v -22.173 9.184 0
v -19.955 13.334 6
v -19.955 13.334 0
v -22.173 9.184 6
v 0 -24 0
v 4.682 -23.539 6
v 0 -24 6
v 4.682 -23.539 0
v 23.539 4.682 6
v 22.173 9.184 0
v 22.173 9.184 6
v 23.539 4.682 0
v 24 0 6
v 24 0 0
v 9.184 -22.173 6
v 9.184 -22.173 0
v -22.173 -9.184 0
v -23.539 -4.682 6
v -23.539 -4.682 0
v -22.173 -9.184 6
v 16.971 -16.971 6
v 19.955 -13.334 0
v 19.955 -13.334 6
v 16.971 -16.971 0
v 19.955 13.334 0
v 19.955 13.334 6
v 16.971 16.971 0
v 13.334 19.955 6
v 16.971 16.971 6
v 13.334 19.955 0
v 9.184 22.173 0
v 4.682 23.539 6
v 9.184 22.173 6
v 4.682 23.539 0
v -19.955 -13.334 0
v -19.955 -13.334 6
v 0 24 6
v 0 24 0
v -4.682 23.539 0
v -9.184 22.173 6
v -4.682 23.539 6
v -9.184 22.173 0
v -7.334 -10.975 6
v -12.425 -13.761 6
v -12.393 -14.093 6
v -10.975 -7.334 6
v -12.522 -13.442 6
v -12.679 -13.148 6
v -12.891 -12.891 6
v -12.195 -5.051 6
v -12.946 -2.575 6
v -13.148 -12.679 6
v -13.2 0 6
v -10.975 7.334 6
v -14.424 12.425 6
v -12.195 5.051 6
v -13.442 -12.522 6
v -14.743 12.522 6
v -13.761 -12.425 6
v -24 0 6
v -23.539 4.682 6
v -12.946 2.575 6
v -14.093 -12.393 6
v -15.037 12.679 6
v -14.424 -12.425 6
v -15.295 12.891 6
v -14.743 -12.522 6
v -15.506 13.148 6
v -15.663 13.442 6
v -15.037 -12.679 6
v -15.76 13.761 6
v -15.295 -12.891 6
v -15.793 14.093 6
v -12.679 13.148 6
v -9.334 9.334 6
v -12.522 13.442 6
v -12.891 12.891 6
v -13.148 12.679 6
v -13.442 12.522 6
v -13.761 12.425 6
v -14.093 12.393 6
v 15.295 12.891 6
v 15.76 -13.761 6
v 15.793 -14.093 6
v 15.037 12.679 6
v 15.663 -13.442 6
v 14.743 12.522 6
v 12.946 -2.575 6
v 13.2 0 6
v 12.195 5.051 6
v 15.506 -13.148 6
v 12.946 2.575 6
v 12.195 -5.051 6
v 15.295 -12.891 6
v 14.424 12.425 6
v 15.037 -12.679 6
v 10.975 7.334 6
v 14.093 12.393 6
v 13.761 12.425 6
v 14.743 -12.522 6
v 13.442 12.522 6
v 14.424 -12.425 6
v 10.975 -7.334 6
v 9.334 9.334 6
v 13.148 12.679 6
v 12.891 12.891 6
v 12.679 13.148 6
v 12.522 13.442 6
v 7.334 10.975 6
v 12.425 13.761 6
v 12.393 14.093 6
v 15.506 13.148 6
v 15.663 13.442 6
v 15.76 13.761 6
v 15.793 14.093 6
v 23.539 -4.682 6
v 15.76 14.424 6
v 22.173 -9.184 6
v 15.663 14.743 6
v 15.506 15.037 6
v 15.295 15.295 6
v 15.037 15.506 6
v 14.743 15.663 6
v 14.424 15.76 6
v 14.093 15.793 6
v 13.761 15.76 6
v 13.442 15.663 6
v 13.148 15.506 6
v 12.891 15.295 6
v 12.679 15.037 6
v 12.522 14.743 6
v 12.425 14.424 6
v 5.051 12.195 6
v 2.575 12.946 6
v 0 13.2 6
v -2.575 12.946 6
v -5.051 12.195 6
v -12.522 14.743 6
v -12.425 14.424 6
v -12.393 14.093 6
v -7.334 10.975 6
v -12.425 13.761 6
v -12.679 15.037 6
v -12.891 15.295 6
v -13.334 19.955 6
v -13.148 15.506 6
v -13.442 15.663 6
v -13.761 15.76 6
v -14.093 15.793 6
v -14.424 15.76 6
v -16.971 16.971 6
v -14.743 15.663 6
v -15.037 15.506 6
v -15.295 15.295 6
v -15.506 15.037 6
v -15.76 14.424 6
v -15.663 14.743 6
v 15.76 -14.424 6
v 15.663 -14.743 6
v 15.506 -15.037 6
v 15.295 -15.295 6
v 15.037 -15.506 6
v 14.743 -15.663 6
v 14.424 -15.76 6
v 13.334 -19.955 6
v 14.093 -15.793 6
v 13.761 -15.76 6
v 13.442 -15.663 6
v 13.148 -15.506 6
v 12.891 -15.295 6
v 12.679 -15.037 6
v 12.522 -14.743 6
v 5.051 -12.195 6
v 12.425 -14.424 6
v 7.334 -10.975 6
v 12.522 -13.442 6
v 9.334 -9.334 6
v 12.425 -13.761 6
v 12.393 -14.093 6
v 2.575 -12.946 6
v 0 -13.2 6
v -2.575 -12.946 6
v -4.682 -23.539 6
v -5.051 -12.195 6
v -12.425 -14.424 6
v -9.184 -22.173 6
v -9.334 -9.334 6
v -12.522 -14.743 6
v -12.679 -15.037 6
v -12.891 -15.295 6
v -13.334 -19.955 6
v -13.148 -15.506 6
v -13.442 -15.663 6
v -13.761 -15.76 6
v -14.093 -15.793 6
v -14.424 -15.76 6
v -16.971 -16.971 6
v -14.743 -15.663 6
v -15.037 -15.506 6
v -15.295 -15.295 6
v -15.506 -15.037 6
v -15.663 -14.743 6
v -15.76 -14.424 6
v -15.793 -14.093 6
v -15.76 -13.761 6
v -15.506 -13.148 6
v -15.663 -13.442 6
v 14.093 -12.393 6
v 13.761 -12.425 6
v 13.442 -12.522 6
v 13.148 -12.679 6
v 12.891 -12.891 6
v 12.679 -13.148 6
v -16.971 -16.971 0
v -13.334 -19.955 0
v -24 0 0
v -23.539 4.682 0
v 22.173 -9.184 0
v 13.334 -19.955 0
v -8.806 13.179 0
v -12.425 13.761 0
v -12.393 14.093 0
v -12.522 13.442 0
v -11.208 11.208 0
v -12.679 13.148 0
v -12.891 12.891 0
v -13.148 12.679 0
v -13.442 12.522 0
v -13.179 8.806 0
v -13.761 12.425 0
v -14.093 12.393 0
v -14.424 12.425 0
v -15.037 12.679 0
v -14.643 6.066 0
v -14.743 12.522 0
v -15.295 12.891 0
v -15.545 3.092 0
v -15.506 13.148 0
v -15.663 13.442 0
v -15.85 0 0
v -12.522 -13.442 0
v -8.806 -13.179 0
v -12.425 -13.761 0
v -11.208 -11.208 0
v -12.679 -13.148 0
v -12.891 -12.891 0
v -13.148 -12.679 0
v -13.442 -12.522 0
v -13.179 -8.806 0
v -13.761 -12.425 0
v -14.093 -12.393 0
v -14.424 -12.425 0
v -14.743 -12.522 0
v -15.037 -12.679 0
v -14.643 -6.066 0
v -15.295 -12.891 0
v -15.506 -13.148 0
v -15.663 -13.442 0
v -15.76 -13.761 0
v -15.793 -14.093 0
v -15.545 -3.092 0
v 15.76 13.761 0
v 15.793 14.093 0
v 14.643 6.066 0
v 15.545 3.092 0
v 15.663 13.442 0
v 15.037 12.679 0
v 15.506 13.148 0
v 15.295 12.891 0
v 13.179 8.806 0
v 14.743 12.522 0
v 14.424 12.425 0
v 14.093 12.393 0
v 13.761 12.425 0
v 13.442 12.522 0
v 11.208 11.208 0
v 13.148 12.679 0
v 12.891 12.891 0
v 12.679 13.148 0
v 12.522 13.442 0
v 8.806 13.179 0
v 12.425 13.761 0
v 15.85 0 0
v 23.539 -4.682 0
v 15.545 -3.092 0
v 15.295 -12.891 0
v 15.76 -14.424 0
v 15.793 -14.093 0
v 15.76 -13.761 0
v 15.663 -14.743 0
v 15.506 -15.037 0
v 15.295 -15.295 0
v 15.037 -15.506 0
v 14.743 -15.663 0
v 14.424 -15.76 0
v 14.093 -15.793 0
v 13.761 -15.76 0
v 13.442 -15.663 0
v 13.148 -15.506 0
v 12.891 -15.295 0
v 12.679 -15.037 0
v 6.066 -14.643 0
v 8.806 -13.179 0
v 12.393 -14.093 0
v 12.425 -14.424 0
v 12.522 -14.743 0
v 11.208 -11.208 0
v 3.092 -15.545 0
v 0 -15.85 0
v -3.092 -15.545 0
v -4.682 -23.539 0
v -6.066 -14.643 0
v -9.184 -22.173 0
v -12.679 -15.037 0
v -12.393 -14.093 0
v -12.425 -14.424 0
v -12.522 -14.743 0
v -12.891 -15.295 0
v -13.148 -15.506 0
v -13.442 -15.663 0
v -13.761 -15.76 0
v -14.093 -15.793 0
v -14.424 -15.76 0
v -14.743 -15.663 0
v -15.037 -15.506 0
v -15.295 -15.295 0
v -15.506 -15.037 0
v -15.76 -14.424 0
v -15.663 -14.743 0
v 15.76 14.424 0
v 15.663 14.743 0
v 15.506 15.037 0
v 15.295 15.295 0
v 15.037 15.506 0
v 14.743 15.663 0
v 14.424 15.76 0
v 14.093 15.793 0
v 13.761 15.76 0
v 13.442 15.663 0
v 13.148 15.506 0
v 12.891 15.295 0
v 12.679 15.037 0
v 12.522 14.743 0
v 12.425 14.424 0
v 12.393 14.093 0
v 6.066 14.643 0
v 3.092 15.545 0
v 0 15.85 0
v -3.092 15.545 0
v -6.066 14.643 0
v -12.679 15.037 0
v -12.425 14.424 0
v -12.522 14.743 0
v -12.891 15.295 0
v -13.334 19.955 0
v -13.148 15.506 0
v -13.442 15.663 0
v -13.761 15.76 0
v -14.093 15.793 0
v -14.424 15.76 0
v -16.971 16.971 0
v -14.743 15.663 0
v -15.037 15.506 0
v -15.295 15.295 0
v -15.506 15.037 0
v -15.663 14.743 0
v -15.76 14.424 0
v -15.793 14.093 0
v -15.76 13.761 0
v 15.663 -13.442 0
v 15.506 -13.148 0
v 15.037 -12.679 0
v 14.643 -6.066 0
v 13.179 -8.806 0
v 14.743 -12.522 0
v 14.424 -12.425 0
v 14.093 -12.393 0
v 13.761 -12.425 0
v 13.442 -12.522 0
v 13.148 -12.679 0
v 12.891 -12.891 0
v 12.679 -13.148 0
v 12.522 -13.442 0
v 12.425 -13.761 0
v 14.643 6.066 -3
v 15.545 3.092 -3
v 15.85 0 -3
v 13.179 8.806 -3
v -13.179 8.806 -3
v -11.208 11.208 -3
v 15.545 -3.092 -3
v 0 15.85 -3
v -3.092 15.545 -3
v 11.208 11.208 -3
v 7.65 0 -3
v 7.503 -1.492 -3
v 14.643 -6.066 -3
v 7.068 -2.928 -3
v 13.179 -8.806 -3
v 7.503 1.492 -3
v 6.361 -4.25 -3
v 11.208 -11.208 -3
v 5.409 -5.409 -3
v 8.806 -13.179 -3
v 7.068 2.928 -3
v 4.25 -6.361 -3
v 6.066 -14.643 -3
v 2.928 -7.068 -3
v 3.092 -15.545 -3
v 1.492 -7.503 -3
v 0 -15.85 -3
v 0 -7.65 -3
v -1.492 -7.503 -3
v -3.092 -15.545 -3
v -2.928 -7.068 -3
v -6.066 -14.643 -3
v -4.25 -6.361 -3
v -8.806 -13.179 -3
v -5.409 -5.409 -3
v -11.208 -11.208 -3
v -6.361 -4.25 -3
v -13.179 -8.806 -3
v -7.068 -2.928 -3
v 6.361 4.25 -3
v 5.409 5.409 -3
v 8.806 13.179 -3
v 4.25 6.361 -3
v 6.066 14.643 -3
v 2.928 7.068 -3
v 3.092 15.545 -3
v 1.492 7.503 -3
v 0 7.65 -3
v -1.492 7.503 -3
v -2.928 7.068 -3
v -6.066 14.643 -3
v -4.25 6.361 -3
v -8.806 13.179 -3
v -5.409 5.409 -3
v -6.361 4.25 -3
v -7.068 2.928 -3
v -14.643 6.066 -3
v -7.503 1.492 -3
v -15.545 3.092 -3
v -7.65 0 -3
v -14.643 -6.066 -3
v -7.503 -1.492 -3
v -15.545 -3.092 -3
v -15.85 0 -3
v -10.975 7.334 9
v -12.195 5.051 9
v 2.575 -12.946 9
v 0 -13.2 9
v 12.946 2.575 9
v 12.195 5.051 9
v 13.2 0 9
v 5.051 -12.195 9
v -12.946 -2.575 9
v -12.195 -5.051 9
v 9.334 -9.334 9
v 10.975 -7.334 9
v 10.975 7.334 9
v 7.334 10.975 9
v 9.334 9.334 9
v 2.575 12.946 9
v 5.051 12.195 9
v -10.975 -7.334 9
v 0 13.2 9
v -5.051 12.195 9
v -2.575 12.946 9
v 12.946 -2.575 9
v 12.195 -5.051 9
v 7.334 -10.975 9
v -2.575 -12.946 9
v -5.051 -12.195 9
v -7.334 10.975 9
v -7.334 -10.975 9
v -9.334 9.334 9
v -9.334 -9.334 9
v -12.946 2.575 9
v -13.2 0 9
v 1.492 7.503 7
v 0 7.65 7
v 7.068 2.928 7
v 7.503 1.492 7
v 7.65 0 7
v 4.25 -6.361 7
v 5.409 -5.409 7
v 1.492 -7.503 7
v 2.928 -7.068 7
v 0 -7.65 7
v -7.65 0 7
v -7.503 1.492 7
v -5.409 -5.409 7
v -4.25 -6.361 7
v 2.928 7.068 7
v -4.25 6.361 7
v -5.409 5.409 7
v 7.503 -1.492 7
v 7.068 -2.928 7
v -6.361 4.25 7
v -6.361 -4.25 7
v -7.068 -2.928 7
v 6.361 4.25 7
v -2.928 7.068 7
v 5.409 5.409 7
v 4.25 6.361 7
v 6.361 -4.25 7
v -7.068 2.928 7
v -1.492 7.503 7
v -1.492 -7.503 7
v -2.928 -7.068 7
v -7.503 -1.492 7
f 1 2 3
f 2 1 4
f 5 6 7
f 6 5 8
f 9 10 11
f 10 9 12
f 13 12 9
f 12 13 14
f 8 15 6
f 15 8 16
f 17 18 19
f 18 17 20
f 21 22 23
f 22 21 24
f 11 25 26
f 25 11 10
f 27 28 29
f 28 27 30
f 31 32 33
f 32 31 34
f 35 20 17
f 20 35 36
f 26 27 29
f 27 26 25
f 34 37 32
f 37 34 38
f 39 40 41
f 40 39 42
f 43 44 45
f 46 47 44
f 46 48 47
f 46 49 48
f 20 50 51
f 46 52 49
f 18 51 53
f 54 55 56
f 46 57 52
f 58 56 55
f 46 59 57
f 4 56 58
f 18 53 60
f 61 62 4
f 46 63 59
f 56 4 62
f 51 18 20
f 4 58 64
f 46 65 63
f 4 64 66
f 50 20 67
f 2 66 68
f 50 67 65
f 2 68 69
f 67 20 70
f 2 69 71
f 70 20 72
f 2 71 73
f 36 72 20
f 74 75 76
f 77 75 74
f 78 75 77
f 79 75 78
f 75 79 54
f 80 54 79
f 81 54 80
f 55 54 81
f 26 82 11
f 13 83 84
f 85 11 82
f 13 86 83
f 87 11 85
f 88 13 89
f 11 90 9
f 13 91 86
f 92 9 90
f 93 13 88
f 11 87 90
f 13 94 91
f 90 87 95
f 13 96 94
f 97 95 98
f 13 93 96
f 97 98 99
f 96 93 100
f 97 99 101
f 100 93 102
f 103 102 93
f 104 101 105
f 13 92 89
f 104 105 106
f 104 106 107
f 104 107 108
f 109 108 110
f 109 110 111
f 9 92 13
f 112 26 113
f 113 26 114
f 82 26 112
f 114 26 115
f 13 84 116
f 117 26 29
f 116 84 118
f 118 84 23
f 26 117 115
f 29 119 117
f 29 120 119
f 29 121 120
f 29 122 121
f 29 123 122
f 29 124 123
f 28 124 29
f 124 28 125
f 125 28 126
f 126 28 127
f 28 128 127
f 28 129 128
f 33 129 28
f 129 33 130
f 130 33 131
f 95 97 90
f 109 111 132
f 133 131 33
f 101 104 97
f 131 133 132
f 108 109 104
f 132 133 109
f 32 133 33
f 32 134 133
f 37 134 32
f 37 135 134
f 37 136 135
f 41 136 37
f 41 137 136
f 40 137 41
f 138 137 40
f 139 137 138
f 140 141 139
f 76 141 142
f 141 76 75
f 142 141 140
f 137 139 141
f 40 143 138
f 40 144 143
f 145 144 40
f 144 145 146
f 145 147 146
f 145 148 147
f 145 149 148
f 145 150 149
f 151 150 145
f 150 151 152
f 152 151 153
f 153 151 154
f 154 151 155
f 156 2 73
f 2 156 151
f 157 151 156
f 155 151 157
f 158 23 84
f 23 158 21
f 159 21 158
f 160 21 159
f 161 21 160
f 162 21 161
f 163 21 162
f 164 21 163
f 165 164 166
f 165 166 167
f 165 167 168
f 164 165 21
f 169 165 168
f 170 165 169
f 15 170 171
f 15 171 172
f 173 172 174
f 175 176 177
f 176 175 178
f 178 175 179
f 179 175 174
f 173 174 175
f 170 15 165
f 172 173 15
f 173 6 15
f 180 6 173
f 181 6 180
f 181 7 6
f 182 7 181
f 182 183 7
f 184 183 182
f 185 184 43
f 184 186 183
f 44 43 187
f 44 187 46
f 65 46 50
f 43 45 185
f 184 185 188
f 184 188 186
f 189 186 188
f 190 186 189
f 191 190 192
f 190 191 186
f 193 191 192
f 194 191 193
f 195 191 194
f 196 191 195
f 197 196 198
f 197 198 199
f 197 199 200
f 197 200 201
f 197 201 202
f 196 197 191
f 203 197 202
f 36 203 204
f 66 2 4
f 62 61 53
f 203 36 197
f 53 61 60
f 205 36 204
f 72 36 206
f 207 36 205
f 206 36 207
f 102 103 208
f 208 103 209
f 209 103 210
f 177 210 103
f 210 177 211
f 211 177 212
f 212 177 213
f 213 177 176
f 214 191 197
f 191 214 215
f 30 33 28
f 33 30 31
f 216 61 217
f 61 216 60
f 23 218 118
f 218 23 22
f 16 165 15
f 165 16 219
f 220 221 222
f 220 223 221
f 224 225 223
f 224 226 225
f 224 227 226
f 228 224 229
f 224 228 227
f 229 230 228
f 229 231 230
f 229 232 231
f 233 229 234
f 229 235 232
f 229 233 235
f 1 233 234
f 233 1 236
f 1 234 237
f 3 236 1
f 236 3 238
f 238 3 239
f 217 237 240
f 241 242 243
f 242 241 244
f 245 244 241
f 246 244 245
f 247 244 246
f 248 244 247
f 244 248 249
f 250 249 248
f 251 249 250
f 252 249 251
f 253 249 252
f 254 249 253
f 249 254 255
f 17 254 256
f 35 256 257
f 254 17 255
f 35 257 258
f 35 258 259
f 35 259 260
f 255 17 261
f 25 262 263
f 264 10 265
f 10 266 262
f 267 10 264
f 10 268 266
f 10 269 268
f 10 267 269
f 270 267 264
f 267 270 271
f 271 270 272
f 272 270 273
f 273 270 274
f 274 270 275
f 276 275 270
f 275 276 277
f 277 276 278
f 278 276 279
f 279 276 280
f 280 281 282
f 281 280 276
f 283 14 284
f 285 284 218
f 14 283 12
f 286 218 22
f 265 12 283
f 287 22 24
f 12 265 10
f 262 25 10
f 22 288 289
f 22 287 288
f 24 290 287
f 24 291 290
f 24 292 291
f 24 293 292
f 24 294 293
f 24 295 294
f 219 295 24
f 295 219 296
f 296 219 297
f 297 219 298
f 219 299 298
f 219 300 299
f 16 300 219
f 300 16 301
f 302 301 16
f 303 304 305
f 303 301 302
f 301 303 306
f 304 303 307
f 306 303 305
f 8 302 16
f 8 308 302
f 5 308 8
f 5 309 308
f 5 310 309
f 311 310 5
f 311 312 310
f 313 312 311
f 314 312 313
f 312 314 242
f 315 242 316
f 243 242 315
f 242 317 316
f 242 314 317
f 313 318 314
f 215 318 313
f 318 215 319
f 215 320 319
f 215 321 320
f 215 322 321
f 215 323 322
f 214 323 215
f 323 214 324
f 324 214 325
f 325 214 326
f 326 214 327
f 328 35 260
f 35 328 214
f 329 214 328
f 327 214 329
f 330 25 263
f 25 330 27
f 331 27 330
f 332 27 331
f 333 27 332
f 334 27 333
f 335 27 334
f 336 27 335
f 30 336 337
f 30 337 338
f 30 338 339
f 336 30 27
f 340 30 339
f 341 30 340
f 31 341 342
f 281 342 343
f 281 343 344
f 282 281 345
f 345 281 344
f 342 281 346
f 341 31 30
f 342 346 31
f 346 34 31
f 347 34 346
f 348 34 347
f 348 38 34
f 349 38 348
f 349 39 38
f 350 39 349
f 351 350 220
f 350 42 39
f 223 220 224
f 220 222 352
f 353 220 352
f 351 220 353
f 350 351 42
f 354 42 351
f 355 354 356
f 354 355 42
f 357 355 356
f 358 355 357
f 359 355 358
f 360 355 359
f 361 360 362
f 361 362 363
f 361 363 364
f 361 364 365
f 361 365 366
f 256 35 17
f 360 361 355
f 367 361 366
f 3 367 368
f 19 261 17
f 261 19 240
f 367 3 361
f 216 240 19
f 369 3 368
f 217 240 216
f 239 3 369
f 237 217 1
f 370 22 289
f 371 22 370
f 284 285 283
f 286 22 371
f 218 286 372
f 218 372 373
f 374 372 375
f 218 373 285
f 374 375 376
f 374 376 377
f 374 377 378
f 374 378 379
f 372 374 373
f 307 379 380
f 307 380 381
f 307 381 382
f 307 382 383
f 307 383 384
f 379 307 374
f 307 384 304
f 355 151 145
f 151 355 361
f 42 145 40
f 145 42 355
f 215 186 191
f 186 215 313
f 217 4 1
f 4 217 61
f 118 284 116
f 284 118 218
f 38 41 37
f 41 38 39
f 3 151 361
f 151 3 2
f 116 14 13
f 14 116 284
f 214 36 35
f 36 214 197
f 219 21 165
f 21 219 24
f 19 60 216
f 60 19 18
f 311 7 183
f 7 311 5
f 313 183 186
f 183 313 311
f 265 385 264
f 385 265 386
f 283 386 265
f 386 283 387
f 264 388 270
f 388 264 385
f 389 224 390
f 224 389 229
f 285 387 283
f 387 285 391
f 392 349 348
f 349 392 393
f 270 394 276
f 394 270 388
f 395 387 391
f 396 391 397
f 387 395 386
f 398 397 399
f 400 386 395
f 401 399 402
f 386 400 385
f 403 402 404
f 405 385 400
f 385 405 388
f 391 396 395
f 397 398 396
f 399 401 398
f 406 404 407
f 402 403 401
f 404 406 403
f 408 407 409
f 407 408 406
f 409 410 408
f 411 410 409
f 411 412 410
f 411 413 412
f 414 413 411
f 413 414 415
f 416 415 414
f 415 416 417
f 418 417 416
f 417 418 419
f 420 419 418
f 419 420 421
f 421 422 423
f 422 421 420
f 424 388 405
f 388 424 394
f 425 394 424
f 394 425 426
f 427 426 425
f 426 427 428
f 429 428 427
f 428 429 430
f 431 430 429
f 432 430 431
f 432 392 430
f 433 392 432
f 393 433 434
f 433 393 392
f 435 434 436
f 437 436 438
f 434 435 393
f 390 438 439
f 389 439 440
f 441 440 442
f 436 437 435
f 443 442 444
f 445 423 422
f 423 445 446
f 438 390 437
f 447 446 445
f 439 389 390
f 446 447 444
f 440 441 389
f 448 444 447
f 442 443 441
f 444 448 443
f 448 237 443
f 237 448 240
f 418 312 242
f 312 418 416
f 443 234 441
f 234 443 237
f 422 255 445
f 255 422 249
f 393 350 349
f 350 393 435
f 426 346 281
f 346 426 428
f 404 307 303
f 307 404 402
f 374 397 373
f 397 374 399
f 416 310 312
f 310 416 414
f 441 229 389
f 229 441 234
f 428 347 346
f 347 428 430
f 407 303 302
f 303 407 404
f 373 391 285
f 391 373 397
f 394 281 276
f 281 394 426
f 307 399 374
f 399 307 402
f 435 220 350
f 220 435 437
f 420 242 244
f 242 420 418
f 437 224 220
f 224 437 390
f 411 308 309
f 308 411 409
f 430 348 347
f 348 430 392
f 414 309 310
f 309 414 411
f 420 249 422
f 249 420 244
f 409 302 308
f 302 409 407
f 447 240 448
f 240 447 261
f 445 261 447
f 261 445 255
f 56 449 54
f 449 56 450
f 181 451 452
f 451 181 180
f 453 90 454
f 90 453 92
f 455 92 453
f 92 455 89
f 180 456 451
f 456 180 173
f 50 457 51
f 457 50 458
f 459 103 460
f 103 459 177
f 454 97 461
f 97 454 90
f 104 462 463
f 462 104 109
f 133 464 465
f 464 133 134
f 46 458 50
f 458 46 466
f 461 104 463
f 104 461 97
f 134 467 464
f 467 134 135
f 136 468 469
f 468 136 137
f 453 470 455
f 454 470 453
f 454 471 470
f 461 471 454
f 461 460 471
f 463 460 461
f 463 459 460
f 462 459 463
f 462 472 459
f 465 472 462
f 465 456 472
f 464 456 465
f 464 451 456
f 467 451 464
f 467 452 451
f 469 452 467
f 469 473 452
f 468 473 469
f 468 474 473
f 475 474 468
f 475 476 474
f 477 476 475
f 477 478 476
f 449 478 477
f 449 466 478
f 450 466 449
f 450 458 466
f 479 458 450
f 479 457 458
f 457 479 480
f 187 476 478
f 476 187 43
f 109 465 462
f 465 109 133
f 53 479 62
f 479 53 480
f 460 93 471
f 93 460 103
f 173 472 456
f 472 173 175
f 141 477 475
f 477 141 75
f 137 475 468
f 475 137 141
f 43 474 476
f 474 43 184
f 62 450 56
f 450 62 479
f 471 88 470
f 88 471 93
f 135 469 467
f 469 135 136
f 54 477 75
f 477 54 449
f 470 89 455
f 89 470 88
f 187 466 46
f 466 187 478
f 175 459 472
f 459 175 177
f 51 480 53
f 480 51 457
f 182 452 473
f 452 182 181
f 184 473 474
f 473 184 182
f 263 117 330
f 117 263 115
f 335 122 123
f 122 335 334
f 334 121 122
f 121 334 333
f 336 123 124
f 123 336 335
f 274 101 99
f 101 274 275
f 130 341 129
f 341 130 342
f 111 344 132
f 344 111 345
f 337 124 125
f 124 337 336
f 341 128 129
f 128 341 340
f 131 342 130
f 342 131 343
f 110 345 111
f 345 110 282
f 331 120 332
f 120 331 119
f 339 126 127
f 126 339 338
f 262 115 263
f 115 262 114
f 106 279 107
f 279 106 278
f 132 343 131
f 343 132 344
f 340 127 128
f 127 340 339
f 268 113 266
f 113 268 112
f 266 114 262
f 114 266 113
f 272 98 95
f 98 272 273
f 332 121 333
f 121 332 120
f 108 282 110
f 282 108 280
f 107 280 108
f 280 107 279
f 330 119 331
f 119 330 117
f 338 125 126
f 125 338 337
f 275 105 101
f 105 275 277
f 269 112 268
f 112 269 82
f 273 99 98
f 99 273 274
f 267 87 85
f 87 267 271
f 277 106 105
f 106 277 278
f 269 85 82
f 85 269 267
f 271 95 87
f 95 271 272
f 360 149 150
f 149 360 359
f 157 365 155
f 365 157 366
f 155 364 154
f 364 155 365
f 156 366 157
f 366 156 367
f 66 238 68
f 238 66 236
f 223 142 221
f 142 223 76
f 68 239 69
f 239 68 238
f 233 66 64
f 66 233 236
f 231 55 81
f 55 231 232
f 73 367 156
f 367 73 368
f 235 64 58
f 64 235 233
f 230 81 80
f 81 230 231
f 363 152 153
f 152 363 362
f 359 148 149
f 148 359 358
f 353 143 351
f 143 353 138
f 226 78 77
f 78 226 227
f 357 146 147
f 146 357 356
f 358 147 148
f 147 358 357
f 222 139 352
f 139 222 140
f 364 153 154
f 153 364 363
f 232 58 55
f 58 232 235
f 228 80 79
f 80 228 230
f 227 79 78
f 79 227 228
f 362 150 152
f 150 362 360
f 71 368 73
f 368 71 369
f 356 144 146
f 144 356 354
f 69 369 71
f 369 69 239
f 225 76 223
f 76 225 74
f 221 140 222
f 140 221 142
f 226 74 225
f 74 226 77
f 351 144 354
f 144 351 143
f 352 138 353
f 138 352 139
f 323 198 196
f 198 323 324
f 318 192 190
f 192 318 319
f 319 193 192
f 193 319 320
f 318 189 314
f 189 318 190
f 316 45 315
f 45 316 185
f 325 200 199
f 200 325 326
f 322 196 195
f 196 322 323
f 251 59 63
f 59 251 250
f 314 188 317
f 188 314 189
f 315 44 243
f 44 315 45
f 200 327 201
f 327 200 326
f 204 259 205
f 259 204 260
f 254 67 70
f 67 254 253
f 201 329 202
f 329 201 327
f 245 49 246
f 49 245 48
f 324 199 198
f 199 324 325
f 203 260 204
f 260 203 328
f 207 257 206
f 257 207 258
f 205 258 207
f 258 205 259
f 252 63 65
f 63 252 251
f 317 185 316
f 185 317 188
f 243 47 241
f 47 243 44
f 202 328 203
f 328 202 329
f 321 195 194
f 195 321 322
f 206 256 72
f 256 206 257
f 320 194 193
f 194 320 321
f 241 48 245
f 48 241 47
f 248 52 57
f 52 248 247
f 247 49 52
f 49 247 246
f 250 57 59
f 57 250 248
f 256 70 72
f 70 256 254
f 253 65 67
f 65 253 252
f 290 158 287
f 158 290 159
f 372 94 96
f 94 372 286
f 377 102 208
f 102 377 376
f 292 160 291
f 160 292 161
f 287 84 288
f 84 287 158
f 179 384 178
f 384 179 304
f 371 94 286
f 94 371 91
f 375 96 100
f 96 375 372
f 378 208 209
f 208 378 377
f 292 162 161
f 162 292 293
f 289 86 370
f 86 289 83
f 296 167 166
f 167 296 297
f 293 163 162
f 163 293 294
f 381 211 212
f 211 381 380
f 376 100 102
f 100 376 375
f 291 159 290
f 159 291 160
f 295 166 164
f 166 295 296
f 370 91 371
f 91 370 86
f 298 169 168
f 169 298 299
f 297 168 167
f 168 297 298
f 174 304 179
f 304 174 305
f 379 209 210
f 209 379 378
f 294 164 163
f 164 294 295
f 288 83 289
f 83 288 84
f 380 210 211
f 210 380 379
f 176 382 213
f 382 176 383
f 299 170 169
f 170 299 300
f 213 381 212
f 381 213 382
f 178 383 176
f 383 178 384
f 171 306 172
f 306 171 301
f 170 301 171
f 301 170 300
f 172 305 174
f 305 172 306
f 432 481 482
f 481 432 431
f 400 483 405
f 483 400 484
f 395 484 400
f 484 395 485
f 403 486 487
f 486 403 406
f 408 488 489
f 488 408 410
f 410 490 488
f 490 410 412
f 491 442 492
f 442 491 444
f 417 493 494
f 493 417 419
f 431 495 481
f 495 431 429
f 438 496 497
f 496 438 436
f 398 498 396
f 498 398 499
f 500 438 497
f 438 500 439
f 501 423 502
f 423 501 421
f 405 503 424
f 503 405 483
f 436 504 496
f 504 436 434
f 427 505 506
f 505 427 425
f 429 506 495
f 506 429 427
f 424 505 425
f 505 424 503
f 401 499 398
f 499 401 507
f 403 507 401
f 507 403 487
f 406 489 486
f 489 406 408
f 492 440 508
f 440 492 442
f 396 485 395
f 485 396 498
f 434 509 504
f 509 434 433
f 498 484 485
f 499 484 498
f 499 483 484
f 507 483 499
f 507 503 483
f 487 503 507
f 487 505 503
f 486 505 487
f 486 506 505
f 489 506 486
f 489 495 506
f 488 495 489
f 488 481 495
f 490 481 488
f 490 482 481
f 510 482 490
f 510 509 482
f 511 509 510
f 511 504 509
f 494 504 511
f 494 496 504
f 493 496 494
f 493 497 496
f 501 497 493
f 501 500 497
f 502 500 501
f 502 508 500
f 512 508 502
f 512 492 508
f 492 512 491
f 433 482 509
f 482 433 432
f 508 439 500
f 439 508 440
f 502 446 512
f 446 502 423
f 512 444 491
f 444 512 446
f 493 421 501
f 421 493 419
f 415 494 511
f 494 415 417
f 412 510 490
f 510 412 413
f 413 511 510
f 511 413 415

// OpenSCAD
$fn = 32;

// ----------------------------------------------------------------------
// Retaining cap: 6002 cover, 48 mm, spigot 31.7 mm
// ----------------------------------------------------------------------

// --- parameters (mm) ---
cover_d = 48;             // cover diameter
cover_t = 6;              // cover thickness
spigot_d = 31.7;          // spigot that enters the housing
spigot_h = 3;             // spigot height
shaft_d = 15.3;           // shaft opening
bolt_d = 3.4;             // bolt clearance
bolt_r = 19.93;           // bolt circle radius
dome_h = 3;               // raised centre

module cover() {
  cylinder(h = cover_t, d = cover_d);
}

module spigot() {
  /* sunk 1 mm into the cover; the spigot sets the overall height */
  translate([0, 0, -spigot_h]) cylinder(h = spigot_h + 1, d = spigot_d);
}

module dome() {
  translate([0, 0, cover_t - 1]) cylinder(h = dome_h + 1, d = cover_d * 0.55);
}

difference() {
  union() {
    cover();
    spigot();
    dome();
  }
  for (i = [0 : 3]) rotate([0, 0, 45 + i * 90]) translate([bolt_r, 0, -spigot_h - 1])
    cylinder(h = spigot_h + cover_t + 2, d = bolt_d);
  translate([0, 0, -spigot_h - 1]) cylinder(h = spigot_h + cover_t + 2, d = shaft_d);
}
